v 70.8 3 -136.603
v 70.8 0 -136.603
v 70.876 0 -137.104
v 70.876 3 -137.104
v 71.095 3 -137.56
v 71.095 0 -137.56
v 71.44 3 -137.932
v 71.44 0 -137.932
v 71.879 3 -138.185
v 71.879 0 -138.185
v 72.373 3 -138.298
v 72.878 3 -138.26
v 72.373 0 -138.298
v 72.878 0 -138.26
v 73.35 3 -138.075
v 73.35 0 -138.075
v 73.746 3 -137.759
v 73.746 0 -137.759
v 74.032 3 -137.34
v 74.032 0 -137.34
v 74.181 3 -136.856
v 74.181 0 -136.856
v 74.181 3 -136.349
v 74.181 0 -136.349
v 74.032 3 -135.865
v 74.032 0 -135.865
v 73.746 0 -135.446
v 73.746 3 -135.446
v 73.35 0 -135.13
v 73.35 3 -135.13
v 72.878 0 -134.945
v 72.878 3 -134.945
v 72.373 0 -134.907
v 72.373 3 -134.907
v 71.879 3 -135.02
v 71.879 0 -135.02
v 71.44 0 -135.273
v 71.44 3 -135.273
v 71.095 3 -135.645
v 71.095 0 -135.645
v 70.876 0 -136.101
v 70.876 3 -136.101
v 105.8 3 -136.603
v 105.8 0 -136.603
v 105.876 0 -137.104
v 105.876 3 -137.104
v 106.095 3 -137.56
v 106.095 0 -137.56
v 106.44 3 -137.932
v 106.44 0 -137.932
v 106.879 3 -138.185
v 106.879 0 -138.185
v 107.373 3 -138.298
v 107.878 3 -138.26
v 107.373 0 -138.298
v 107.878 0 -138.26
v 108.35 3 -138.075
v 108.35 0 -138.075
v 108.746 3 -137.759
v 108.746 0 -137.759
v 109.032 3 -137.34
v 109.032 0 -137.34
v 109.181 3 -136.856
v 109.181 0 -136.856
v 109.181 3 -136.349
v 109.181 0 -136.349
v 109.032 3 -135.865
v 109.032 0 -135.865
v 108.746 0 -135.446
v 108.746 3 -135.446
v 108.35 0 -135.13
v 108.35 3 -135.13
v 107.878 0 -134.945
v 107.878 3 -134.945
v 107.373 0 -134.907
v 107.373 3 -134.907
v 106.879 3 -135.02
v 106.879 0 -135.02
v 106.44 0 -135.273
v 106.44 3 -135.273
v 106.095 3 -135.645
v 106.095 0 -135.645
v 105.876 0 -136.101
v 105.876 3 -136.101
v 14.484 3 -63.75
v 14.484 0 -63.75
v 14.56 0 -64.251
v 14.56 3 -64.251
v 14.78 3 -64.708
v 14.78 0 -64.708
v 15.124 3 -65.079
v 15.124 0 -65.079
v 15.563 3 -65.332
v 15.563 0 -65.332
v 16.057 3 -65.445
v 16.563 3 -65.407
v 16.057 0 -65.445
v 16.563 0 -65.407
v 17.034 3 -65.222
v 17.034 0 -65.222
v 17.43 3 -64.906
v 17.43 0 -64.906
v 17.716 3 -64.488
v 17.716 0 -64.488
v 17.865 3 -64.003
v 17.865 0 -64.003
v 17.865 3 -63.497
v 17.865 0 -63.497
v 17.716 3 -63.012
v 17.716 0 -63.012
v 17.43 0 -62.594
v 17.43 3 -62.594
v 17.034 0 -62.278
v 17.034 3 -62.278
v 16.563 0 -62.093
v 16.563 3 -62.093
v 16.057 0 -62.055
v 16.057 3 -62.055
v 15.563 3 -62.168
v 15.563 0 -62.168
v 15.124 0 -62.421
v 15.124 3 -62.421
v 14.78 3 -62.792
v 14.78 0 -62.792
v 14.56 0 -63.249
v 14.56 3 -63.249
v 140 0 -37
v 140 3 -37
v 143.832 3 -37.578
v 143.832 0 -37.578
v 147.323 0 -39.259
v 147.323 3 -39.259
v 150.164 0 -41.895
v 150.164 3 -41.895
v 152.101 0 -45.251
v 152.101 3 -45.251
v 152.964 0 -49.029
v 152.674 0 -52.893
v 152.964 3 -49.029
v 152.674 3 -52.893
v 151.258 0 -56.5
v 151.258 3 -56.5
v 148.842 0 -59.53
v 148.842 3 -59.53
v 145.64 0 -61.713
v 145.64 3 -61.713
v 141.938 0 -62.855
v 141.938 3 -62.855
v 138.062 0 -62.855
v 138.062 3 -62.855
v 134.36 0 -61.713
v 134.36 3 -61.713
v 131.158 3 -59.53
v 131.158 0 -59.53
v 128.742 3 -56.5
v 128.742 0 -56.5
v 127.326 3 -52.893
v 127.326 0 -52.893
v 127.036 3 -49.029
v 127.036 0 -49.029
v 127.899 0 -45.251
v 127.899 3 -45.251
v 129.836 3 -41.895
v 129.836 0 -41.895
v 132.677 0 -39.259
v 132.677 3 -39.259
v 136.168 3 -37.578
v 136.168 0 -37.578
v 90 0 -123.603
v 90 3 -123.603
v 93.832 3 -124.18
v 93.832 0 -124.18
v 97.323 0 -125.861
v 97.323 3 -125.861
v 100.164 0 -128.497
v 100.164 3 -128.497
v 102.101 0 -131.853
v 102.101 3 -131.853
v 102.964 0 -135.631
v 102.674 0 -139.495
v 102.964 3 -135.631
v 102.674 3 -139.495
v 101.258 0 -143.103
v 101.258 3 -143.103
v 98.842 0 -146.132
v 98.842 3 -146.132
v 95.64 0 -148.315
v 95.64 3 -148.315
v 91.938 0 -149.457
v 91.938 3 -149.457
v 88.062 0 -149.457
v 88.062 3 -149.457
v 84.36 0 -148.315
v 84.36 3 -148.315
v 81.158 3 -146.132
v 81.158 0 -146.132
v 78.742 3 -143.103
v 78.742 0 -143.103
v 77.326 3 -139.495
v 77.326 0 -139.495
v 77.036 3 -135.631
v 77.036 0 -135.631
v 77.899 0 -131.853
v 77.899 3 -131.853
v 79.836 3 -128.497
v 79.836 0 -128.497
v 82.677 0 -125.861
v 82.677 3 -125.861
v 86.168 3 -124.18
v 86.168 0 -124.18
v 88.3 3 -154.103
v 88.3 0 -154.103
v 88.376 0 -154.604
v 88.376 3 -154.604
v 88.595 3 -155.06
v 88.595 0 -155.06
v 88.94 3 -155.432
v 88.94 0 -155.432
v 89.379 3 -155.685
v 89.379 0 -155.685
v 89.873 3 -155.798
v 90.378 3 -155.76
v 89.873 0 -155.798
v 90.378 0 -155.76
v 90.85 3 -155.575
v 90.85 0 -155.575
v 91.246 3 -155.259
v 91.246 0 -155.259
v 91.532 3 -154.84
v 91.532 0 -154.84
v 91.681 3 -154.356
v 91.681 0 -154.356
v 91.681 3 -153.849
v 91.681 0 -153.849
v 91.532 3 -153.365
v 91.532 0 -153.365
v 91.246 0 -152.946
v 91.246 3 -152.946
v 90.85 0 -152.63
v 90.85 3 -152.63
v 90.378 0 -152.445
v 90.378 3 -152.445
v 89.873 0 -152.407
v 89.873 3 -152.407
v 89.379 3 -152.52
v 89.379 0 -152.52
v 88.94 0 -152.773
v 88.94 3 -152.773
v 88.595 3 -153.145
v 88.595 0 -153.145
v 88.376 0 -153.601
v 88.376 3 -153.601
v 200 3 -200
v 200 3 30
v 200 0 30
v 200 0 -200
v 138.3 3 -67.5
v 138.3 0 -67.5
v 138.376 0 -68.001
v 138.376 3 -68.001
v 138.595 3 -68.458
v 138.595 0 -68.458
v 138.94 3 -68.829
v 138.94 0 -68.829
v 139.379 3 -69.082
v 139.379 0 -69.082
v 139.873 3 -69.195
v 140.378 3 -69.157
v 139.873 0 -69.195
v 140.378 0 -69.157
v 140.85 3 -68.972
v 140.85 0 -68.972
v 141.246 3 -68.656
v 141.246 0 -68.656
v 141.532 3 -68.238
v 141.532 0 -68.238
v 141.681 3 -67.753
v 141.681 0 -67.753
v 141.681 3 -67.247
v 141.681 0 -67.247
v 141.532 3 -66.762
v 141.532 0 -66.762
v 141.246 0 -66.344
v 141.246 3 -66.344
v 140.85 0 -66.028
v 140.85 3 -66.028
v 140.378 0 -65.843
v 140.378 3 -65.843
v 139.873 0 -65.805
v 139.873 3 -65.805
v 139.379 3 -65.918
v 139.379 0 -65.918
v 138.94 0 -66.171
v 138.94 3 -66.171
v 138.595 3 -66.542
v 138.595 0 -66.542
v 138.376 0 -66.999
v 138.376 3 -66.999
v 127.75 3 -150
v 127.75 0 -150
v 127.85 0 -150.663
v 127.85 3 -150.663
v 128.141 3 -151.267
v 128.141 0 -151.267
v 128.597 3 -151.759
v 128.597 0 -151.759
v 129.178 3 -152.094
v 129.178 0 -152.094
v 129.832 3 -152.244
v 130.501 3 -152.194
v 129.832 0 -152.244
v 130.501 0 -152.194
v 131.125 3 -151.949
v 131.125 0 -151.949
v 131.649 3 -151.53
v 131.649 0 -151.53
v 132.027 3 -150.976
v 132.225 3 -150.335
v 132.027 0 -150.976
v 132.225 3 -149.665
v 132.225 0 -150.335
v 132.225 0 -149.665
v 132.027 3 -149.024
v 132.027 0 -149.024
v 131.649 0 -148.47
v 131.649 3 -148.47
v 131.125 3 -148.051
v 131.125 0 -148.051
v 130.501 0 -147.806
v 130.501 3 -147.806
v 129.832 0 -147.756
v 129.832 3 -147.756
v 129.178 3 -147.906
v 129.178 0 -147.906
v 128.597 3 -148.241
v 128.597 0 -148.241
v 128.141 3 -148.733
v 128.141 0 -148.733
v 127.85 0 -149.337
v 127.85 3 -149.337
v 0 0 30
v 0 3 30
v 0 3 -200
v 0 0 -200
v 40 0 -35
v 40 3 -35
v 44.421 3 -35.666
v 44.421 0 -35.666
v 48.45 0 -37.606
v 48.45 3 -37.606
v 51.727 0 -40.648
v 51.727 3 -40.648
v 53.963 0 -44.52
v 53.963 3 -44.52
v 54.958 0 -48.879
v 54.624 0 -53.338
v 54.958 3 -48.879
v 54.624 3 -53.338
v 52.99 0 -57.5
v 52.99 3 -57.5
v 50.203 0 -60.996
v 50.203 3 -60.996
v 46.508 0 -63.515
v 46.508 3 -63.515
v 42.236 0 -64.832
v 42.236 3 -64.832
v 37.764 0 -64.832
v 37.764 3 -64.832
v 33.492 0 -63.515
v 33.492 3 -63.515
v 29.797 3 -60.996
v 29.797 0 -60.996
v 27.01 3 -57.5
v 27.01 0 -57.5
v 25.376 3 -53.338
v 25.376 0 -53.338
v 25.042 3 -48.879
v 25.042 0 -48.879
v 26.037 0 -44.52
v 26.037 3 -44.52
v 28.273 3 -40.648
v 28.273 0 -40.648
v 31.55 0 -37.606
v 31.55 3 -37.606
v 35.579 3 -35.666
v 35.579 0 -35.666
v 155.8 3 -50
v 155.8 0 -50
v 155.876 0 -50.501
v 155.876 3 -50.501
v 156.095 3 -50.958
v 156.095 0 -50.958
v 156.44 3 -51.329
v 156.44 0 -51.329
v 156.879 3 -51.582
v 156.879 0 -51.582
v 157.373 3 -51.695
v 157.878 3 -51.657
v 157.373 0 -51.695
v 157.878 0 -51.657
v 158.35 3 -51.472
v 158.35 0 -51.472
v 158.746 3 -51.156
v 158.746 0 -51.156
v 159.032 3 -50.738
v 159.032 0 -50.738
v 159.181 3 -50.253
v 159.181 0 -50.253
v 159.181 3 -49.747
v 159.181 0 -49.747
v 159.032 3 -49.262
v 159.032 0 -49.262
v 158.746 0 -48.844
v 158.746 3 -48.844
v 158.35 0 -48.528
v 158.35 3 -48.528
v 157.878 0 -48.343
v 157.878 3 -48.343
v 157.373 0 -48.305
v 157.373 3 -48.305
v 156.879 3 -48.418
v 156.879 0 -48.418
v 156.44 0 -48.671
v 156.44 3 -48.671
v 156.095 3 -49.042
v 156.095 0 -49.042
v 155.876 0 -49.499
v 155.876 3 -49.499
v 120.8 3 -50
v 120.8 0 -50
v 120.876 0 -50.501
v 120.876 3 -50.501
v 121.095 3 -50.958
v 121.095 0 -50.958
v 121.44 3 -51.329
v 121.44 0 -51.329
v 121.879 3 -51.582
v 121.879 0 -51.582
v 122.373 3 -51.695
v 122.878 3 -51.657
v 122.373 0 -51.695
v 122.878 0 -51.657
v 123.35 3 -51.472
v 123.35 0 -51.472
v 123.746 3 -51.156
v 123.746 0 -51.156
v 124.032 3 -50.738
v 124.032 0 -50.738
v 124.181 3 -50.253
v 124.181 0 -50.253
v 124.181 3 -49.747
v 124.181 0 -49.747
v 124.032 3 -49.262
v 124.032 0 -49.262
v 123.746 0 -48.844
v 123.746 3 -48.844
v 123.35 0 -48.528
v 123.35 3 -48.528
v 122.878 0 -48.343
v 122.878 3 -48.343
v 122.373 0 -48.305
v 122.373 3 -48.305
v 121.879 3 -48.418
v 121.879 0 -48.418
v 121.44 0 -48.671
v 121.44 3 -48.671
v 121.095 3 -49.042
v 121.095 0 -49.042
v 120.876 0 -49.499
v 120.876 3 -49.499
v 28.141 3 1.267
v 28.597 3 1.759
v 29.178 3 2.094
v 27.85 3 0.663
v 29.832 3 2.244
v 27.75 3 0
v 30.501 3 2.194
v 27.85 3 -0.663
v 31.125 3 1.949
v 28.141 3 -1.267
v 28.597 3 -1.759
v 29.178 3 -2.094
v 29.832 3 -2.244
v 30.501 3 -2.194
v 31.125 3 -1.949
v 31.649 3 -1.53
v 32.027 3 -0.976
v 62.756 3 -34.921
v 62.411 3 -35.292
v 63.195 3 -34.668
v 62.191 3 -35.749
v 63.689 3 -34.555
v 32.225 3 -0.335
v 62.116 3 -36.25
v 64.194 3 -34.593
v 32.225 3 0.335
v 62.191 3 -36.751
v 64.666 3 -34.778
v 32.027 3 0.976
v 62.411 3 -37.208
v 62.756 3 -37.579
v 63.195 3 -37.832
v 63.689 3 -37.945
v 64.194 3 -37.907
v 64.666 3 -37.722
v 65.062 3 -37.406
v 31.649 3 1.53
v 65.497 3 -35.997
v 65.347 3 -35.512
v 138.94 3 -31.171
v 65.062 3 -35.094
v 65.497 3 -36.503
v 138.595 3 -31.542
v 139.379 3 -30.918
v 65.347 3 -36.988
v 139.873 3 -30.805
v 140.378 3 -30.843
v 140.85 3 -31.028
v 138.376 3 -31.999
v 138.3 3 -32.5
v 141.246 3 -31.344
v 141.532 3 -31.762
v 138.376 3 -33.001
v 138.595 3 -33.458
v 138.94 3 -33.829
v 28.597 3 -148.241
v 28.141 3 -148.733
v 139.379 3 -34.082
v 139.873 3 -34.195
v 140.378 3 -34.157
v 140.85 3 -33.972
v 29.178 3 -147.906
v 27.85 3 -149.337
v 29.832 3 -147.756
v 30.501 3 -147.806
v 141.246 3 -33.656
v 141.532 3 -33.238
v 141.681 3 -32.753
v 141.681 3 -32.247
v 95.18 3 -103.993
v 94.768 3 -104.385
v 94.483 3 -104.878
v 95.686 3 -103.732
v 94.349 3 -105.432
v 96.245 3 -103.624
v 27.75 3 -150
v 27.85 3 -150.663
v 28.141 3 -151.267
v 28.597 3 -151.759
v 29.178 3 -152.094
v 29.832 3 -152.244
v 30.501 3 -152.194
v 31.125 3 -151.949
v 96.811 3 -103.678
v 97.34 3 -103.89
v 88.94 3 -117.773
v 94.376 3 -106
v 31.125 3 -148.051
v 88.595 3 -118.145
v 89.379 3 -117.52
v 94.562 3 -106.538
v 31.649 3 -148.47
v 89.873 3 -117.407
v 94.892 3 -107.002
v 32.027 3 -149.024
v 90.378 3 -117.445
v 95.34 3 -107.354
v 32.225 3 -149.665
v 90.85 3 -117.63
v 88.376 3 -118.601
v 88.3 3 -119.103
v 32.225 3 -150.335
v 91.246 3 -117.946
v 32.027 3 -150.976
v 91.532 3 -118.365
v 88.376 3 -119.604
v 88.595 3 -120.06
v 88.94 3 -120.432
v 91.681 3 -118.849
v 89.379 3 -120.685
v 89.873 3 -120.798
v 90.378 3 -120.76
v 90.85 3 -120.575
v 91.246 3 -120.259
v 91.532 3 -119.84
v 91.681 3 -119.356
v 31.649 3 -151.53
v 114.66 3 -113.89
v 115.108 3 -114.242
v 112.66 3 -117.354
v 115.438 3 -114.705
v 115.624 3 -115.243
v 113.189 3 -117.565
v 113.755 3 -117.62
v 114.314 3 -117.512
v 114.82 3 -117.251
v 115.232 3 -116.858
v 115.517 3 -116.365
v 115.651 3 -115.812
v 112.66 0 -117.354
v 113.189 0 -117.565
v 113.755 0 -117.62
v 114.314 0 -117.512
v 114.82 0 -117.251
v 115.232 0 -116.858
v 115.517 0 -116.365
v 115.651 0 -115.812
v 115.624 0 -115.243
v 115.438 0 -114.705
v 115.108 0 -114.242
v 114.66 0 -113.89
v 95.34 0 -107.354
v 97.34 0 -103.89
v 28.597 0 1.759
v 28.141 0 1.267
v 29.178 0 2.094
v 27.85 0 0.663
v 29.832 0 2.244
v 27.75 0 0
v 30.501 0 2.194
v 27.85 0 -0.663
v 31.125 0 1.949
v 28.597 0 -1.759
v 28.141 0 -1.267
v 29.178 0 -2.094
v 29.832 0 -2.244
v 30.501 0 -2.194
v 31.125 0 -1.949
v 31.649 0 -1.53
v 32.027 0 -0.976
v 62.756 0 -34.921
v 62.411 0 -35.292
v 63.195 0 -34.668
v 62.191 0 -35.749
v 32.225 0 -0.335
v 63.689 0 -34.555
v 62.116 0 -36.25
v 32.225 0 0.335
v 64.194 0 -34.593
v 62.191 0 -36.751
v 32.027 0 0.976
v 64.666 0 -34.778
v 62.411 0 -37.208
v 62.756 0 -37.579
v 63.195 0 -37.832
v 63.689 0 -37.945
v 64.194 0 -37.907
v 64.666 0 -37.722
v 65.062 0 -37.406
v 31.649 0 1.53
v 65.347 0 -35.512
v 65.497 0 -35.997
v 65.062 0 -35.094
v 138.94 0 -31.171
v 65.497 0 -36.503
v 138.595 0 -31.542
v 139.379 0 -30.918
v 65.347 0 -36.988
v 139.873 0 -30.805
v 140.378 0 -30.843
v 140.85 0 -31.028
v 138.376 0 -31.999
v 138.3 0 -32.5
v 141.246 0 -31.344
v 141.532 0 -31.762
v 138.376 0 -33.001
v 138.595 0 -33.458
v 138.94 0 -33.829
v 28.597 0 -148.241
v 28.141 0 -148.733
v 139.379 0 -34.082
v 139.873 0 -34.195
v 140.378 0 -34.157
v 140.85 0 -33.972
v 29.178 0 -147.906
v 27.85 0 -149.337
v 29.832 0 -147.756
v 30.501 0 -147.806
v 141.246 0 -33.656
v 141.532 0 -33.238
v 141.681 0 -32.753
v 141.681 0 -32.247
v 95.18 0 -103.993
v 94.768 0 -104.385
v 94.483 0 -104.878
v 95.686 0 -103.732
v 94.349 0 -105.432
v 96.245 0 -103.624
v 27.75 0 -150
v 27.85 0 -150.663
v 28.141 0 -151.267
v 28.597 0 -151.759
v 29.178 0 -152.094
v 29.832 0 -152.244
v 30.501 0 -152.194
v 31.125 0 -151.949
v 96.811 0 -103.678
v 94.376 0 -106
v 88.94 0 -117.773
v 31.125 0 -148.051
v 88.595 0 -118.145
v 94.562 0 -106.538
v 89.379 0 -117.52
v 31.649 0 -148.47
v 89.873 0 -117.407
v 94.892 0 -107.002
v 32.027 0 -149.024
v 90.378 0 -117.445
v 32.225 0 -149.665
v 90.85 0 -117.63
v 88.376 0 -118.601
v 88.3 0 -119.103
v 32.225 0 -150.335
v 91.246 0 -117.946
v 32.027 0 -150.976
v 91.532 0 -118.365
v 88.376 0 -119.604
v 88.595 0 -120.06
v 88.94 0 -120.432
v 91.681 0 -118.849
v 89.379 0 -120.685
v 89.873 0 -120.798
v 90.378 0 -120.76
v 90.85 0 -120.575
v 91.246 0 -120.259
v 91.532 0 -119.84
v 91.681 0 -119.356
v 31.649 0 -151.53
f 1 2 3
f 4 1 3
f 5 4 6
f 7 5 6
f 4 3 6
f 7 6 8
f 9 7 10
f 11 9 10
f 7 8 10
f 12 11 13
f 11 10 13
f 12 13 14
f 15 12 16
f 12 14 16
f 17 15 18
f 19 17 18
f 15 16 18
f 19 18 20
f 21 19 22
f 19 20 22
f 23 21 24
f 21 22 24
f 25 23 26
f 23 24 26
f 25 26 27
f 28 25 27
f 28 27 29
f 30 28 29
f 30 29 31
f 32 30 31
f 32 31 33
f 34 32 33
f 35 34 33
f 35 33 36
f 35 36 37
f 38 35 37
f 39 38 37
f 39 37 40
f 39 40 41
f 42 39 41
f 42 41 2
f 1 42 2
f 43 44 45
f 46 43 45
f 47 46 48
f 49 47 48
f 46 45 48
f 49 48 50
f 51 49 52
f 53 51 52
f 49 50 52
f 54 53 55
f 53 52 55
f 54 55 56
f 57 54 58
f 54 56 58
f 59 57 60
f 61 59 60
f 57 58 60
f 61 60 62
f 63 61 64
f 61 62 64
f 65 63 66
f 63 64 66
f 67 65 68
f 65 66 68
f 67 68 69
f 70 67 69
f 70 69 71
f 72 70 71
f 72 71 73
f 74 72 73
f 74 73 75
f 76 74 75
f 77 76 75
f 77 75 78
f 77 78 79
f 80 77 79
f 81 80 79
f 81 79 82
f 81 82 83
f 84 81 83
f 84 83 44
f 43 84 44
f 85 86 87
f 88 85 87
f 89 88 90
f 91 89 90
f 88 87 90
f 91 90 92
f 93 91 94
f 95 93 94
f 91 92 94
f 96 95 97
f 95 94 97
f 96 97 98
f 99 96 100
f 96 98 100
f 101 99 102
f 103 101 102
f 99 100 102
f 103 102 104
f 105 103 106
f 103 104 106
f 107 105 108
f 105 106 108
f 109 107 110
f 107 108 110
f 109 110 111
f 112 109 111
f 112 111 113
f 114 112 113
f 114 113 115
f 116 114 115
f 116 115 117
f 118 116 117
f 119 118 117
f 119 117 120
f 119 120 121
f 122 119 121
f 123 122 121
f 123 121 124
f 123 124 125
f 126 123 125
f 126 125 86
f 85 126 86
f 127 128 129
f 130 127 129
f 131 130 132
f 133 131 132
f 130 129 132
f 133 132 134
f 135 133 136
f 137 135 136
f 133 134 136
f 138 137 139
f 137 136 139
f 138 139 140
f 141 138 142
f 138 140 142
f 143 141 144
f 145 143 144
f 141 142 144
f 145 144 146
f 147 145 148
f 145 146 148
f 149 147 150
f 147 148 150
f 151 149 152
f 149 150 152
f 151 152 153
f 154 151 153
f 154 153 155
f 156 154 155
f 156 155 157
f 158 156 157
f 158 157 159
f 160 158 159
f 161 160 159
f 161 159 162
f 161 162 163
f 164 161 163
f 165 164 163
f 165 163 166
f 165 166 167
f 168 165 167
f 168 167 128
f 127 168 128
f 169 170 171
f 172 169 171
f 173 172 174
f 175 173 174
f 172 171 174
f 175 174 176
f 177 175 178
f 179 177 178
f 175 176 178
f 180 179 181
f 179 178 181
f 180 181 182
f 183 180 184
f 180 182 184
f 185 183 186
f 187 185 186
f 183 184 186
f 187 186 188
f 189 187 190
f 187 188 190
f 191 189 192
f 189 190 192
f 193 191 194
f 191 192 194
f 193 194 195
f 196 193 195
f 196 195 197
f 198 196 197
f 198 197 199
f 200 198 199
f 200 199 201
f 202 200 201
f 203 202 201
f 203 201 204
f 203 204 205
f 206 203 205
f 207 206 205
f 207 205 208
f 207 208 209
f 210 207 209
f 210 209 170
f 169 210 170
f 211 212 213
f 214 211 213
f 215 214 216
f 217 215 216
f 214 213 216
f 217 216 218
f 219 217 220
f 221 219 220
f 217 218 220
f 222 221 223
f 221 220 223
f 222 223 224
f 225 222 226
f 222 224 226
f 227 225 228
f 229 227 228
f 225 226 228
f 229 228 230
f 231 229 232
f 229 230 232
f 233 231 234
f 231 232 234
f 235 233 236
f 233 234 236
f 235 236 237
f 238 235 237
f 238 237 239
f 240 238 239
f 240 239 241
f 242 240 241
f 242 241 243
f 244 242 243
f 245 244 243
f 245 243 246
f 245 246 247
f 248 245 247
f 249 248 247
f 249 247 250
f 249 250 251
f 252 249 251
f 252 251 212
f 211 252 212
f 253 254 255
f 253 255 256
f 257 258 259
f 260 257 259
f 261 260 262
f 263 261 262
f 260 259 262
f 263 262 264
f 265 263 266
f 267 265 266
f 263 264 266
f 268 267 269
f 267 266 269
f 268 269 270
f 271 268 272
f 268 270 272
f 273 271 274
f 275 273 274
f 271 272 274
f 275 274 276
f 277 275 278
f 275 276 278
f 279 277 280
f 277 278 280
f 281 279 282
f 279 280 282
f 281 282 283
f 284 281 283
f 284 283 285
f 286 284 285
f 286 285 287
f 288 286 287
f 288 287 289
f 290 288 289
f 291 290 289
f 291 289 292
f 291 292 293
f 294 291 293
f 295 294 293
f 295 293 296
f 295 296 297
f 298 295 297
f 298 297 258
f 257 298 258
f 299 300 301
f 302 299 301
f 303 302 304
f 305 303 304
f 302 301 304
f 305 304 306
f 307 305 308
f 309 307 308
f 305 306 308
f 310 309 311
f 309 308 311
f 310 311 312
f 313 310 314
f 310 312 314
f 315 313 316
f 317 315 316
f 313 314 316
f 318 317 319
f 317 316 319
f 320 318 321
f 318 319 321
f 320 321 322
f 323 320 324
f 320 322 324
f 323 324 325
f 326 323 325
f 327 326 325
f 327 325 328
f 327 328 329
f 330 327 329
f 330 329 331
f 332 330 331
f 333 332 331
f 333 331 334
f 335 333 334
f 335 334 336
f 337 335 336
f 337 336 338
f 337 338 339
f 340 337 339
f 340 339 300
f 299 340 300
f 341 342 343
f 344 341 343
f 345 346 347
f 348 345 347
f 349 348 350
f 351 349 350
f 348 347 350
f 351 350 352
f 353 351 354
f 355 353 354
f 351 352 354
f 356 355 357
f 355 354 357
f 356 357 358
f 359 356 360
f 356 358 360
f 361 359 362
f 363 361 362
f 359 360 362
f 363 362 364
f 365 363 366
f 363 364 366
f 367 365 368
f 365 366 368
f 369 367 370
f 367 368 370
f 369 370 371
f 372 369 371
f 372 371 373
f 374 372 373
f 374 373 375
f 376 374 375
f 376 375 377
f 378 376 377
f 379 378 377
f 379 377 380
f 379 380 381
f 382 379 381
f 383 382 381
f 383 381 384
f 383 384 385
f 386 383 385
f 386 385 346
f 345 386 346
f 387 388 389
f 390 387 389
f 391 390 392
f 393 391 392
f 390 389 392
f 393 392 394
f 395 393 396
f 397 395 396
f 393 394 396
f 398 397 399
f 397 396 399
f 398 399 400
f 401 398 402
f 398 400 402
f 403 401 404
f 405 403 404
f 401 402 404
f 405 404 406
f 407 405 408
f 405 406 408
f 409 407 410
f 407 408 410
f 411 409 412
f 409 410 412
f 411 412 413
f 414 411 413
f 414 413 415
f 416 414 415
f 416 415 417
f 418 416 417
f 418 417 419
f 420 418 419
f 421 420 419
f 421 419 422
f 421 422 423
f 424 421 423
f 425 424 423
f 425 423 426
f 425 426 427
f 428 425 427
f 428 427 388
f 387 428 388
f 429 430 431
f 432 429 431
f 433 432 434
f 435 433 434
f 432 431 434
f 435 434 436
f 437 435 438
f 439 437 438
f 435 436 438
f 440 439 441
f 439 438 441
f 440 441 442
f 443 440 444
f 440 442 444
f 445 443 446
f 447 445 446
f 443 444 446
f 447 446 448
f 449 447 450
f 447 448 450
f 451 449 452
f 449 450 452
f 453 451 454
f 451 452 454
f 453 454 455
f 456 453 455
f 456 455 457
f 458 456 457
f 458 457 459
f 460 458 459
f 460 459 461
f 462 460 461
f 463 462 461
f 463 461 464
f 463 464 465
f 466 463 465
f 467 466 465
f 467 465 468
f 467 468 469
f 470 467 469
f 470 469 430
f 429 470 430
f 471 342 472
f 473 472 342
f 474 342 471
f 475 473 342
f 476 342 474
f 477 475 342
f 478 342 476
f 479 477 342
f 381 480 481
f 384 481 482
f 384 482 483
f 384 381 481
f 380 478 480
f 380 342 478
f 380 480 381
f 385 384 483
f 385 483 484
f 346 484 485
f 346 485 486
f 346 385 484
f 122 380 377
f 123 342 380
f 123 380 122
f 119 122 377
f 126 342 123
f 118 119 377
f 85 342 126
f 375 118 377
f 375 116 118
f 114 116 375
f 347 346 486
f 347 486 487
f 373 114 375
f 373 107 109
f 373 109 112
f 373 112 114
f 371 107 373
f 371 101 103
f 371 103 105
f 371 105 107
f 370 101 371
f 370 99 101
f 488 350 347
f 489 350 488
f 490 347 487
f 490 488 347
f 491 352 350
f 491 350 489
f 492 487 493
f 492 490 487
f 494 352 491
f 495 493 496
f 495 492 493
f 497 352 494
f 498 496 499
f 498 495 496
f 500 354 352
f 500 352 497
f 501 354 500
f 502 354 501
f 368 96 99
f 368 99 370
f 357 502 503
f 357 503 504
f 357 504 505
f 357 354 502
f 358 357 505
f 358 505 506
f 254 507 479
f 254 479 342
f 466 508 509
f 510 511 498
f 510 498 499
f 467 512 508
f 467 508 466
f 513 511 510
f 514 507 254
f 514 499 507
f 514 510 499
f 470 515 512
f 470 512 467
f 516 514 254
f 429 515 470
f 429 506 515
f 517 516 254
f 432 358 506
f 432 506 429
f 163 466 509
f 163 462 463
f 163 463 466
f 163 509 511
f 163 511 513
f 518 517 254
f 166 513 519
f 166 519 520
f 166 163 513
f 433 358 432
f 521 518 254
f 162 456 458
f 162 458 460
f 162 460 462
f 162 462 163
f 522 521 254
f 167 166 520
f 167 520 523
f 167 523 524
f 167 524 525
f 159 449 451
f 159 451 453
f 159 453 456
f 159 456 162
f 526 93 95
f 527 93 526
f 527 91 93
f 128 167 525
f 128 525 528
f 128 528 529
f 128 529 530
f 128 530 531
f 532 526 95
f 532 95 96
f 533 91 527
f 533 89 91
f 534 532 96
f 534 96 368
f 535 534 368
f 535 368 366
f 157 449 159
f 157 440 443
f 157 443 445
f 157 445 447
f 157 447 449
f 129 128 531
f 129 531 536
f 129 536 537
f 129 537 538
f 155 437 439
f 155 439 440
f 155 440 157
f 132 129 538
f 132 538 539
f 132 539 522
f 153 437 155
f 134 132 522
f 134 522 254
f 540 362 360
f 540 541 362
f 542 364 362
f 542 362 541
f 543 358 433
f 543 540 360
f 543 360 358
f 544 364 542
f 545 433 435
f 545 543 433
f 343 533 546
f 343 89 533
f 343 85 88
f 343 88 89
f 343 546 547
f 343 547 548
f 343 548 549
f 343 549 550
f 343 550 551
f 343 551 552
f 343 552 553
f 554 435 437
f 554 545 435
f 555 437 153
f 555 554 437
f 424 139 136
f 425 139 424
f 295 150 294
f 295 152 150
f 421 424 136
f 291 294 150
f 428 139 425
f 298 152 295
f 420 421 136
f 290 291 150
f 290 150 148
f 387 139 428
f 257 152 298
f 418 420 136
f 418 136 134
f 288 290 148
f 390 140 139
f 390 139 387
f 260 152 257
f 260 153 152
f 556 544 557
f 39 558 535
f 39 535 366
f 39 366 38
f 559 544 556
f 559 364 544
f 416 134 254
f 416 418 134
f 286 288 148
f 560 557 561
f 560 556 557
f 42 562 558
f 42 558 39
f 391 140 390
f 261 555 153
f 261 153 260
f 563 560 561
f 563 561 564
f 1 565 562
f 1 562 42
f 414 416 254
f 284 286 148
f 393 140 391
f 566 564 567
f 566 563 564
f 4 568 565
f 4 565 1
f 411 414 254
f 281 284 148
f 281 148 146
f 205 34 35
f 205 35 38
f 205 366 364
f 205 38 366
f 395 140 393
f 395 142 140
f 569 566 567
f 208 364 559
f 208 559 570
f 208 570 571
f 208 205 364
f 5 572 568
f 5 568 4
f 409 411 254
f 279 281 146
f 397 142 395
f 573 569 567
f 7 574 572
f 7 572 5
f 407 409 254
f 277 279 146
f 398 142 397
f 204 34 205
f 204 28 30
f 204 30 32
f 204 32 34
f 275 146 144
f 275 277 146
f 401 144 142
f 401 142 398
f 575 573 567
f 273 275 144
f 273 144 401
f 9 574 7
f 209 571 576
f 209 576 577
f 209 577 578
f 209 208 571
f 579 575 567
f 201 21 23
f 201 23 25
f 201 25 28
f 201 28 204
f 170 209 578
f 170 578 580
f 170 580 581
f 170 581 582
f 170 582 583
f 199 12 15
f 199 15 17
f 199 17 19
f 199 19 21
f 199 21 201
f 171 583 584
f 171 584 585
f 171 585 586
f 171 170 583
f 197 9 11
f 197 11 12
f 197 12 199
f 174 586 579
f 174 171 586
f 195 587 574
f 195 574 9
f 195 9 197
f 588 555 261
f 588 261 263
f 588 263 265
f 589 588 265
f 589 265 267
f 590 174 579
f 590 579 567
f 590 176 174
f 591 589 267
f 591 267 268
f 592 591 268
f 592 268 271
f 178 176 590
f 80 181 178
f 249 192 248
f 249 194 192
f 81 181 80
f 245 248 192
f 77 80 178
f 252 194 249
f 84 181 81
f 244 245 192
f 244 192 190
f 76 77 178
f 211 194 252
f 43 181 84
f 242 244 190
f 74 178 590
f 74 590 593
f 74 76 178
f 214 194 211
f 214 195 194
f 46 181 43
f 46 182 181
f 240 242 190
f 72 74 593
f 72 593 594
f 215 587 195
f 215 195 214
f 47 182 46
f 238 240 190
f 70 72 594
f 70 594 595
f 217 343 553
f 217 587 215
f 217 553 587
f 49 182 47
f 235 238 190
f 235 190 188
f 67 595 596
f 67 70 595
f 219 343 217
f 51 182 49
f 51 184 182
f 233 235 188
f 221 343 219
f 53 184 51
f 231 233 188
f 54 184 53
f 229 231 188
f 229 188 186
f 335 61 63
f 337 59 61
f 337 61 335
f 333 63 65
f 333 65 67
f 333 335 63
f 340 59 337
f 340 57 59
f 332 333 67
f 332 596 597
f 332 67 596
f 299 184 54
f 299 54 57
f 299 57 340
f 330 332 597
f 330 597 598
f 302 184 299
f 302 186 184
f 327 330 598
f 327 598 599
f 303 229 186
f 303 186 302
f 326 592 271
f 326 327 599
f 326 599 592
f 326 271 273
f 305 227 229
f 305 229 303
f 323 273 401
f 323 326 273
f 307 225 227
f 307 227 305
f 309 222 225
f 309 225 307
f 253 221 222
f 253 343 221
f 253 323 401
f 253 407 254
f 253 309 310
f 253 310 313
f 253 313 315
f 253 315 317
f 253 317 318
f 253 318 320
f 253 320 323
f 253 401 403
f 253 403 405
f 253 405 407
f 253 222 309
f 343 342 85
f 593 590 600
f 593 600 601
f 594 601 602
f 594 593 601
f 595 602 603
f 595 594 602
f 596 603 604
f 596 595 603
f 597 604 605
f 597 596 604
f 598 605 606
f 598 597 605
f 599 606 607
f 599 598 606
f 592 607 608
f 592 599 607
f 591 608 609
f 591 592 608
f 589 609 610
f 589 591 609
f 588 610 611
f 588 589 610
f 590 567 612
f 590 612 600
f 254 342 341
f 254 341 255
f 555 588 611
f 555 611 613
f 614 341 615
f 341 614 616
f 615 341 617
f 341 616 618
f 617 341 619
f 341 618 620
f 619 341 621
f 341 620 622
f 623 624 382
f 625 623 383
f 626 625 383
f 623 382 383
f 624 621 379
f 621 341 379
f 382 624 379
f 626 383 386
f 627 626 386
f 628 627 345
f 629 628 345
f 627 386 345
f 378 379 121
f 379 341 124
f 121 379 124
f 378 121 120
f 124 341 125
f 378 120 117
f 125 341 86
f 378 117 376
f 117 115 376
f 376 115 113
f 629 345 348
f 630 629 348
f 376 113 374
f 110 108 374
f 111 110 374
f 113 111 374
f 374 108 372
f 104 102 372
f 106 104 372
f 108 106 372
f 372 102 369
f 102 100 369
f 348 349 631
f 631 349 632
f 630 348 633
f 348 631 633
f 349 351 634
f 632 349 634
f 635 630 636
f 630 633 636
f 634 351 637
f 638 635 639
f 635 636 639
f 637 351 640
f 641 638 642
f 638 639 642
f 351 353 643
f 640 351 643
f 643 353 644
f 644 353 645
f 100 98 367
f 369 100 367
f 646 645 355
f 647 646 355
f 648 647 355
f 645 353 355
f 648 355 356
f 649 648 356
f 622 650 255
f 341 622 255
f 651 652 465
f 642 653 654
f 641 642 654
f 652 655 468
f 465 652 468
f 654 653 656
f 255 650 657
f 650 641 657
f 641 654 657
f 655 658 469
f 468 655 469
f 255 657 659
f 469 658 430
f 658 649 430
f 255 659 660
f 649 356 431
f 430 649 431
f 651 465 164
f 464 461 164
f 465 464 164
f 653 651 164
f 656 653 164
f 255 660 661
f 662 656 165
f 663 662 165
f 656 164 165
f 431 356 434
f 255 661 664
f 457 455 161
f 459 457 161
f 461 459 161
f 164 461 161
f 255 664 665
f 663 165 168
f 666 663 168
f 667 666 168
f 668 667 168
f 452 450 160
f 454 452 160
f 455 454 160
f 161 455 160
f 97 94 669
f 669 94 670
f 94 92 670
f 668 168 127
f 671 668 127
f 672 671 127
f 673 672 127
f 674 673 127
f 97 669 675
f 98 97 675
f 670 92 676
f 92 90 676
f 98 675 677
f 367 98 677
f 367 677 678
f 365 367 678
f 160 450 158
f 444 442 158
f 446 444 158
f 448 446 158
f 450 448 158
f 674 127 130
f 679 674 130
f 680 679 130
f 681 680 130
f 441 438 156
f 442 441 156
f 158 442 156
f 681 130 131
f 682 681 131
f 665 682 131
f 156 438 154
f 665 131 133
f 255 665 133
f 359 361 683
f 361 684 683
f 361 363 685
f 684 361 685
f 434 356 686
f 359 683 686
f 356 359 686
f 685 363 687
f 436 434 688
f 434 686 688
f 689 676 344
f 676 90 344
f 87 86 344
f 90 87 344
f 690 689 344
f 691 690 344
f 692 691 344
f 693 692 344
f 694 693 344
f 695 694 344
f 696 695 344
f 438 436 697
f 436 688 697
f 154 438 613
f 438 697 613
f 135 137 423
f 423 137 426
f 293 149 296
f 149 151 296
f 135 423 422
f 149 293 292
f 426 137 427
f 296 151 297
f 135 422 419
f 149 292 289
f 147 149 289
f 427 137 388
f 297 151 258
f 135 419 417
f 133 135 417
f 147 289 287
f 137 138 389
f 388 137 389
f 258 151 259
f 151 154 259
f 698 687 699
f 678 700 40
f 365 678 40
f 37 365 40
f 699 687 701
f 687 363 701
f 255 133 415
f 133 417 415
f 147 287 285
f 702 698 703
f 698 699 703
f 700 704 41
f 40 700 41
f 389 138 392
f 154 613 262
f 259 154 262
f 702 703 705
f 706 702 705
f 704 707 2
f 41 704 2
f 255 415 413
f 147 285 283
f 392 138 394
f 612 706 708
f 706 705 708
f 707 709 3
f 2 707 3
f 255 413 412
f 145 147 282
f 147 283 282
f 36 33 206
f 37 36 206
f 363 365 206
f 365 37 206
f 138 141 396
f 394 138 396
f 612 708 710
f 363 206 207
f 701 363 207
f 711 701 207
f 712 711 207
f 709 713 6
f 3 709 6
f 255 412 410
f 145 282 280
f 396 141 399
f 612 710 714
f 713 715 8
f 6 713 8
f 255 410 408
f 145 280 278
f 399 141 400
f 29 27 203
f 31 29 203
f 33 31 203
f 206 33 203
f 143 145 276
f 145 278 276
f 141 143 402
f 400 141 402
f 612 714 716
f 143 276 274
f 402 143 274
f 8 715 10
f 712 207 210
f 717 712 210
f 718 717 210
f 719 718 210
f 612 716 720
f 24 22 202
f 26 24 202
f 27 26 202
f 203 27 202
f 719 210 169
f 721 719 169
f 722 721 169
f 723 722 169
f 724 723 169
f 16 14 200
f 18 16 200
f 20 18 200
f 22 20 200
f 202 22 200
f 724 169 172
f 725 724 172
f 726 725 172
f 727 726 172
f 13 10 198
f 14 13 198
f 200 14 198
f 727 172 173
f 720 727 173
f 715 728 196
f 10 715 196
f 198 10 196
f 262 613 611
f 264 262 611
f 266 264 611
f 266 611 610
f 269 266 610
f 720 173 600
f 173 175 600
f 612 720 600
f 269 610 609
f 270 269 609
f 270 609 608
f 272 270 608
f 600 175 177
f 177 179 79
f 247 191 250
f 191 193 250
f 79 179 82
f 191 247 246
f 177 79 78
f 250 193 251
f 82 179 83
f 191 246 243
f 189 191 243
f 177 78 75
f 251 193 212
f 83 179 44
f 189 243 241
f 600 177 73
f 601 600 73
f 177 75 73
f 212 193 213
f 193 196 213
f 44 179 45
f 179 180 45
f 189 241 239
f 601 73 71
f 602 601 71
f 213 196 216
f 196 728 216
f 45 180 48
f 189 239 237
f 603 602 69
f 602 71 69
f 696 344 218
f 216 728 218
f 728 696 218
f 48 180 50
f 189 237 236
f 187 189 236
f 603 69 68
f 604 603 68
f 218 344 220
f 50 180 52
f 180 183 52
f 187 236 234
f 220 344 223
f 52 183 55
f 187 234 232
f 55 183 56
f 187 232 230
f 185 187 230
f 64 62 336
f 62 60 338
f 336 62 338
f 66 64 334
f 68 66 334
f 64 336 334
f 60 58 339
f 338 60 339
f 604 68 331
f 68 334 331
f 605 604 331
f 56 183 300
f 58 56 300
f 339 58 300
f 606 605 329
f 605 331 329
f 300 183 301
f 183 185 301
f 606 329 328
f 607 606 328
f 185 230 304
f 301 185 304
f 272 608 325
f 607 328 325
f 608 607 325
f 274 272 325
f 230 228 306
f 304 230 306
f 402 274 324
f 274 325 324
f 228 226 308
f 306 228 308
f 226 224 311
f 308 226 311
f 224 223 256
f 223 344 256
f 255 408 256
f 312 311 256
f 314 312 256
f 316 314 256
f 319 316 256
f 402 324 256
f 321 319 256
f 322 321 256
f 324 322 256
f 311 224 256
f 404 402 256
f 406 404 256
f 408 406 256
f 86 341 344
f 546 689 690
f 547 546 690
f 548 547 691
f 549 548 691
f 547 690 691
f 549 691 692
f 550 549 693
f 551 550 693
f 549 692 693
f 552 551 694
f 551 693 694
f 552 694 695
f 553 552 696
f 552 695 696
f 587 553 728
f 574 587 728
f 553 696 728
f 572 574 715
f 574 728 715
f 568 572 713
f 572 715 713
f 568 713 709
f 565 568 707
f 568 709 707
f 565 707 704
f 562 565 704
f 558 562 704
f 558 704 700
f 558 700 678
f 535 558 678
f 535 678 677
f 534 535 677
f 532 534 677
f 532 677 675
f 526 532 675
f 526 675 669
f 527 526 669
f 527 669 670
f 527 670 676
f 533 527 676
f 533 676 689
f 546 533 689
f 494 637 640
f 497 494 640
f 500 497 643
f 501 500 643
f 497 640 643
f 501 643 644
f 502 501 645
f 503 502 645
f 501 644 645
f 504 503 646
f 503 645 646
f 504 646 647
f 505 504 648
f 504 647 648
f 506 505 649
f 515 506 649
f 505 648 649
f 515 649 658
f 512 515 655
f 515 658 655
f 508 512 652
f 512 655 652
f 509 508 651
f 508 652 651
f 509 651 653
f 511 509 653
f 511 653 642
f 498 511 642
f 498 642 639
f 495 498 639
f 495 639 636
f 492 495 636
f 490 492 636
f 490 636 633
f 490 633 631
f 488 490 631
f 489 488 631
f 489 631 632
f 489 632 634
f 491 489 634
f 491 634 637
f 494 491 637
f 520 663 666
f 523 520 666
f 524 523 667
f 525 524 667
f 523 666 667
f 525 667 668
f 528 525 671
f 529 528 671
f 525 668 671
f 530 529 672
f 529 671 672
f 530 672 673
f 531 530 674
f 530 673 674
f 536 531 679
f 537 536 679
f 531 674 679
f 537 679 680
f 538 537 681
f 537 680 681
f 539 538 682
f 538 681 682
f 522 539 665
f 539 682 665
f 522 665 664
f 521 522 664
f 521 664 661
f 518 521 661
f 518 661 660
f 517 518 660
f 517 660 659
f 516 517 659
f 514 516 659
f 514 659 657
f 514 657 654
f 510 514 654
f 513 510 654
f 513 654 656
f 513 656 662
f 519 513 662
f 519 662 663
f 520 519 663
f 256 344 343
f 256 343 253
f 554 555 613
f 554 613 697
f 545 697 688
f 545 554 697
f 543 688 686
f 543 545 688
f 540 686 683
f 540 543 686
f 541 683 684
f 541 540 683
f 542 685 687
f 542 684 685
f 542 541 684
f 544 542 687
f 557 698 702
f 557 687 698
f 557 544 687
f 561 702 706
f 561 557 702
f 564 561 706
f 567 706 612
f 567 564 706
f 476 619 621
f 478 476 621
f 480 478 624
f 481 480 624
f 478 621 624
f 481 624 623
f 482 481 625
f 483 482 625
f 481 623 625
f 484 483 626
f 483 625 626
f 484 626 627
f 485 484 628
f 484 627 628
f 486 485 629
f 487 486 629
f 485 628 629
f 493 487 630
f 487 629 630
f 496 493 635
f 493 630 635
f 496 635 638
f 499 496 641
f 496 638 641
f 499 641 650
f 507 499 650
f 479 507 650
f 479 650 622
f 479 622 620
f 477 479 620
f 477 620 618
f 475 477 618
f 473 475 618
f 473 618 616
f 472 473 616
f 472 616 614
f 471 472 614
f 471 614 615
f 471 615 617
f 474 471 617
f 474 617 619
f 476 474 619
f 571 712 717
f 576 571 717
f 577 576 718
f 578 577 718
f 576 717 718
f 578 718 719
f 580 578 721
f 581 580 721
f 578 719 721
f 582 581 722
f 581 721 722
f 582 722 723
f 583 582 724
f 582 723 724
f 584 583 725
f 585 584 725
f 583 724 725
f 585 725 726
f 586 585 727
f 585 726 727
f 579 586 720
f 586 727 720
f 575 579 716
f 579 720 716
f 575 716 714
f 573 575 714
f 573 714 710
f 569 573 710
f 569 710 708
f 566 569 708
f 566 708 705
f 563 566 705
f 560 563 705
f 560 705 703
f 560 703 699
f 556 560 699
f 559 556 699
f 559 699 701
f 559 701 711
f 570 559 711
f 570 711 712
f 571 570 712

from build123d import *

# Parameters (mm, degrees)
SKETCH1_W                = 200
SKETCH1_H                = 200
BOSS_EXTRUDE1_DEPTH      = 3
SKETCH2_R                = 13
SKETCH2_R_2              = 15
CUT_EXTRUDE1_DEPTH       = 283.85862193
M3_CLEARANCE_HOLE1_D     = 3.4
M3_CLEARANCE_HOLE2_D     = 3.4
SKETCH8_W                = 200
SKETCH8_H                = 30
BOSS_EXTRUDE2_DEPTH      = 3
M4_CLEARANCE_HOLE1_D     = 4.5
M4_CLEARANCE_HOLE1_DEPTH = 7
M4_CLEARANCE_HOLE1_TIP   = 1.351936393


with BuildPart() as part:
    # Sketch1 → Boss-Extrude1 (new body)
    with BuildSketch(Plane(origin=(0, 0, 0), x_dir=(1, 0, 0), z_dir=(0, 1, 0))):
        with Locations((100, 100)):
            Rectangle(SKETCH1_W, SKETCH1_H)
    extrude(amount=BOSS_EXTRUDE1_DEPTH)

    # Sketch2 → Cut-Extrude1 (cut, through all)
    with BuildSketch(Plane(origin=(0, 3, 0), x_dir=(1, 0, 0), z_dir=(0, 1, 0))):
        with Locations(Location((90, 136.602540378, 0), (0, 0, 270))):
            Circle(SKETCH2_R)
        with Locations(Location((140, 50, 0), (0, 0, 270))):
            Circle(SKETCH2_R)
        with Locations(Location((40, 50, 0), (0, 0, 270))):
            Circle(SKETCH2_R_2)
        with BuildLine():
            Line((95.339745962, 107.353829072), (112.660254038, 117.353829072))
            ThreePointArc((112.660254038, 117.353829072), (115.392304845, 116.621778265), (114.660254038, 113.889727457))
            Line((114.660254038, 113.889727457), (97.339745962, 103.889727457))
            ThreePointArc((97.339745962, 103.889727457), (94.607695155, 104.621778265), (95.339745962, 107.353829072))
        make_face()
    extrude(amount=-CUT_EXTRUDE1_DEPTH, mode=Mode.SUBTRACT)

    # M3 Clearance Hole1 (through all)
    with Locations(Plane(origin=(0, 3, 0), x_dir=(1, 0, 0), z_dir=(0, 1, 0))):
        with Locations((140, 67.5), (122.5, 50), (157.5, 50), (140, 32.5), (90, 119.102540378), (72.5, 136.602540378), (107.5, 136.602540378), (90, 154.102540378)):
            Hole(M3_CLEARANCE_HOLE1_D / 2)

    # M3 Clearance Hole2 (through all)
    with Locations(Plane(origin=(0, 3, 0), x_dir=(1, 0, 0), z_dir=(0, 1, 0))):
        with Locations((16.184301396, 63.75), (63.815698604, 36.25)):
            Hole(M3_CLEARANCE_HOLE2_D / 2)

    # Sketch8 → Boss-Extrude2 (add)
    with BuildSketch(Plane(origin=(0, 3, 0), x_dir=(1, 0, 0), z_dir=(0, 1, 0))):
        with Locations((100, -15)):
            Rectangle(SKETCH8_W, SKETCH8_H)
    extrude(amount=-BOSS_EXTRUDE2_DEPTH)

    # M4 Clearance Hole1
    with Locations(Plane(origin=(0, 3, 0), x_dir=(1, 0, 0), z_dir=(0, 1, 0))):
        with Locations((30, 0), (30, 150), (130, 150)):
            Hole(M4_CLEARANCE_HOLE1_D / 2, depth=M4_CLEARANCE_HOLE1_DEPTH)
            with Locations((0, 0, -(M4_CLEARANCE_HOLE1_DEPTH + M4_CLEARANCE_HOLE1_TIP / 2))):  # 118° drill point
                Cone(0, M4_CLEARANCE_HOLE1_D / 2, M4_CLEARANCE_HOLE1_TIP, mode=Mode.SUBTRACT)


solid = part.part
